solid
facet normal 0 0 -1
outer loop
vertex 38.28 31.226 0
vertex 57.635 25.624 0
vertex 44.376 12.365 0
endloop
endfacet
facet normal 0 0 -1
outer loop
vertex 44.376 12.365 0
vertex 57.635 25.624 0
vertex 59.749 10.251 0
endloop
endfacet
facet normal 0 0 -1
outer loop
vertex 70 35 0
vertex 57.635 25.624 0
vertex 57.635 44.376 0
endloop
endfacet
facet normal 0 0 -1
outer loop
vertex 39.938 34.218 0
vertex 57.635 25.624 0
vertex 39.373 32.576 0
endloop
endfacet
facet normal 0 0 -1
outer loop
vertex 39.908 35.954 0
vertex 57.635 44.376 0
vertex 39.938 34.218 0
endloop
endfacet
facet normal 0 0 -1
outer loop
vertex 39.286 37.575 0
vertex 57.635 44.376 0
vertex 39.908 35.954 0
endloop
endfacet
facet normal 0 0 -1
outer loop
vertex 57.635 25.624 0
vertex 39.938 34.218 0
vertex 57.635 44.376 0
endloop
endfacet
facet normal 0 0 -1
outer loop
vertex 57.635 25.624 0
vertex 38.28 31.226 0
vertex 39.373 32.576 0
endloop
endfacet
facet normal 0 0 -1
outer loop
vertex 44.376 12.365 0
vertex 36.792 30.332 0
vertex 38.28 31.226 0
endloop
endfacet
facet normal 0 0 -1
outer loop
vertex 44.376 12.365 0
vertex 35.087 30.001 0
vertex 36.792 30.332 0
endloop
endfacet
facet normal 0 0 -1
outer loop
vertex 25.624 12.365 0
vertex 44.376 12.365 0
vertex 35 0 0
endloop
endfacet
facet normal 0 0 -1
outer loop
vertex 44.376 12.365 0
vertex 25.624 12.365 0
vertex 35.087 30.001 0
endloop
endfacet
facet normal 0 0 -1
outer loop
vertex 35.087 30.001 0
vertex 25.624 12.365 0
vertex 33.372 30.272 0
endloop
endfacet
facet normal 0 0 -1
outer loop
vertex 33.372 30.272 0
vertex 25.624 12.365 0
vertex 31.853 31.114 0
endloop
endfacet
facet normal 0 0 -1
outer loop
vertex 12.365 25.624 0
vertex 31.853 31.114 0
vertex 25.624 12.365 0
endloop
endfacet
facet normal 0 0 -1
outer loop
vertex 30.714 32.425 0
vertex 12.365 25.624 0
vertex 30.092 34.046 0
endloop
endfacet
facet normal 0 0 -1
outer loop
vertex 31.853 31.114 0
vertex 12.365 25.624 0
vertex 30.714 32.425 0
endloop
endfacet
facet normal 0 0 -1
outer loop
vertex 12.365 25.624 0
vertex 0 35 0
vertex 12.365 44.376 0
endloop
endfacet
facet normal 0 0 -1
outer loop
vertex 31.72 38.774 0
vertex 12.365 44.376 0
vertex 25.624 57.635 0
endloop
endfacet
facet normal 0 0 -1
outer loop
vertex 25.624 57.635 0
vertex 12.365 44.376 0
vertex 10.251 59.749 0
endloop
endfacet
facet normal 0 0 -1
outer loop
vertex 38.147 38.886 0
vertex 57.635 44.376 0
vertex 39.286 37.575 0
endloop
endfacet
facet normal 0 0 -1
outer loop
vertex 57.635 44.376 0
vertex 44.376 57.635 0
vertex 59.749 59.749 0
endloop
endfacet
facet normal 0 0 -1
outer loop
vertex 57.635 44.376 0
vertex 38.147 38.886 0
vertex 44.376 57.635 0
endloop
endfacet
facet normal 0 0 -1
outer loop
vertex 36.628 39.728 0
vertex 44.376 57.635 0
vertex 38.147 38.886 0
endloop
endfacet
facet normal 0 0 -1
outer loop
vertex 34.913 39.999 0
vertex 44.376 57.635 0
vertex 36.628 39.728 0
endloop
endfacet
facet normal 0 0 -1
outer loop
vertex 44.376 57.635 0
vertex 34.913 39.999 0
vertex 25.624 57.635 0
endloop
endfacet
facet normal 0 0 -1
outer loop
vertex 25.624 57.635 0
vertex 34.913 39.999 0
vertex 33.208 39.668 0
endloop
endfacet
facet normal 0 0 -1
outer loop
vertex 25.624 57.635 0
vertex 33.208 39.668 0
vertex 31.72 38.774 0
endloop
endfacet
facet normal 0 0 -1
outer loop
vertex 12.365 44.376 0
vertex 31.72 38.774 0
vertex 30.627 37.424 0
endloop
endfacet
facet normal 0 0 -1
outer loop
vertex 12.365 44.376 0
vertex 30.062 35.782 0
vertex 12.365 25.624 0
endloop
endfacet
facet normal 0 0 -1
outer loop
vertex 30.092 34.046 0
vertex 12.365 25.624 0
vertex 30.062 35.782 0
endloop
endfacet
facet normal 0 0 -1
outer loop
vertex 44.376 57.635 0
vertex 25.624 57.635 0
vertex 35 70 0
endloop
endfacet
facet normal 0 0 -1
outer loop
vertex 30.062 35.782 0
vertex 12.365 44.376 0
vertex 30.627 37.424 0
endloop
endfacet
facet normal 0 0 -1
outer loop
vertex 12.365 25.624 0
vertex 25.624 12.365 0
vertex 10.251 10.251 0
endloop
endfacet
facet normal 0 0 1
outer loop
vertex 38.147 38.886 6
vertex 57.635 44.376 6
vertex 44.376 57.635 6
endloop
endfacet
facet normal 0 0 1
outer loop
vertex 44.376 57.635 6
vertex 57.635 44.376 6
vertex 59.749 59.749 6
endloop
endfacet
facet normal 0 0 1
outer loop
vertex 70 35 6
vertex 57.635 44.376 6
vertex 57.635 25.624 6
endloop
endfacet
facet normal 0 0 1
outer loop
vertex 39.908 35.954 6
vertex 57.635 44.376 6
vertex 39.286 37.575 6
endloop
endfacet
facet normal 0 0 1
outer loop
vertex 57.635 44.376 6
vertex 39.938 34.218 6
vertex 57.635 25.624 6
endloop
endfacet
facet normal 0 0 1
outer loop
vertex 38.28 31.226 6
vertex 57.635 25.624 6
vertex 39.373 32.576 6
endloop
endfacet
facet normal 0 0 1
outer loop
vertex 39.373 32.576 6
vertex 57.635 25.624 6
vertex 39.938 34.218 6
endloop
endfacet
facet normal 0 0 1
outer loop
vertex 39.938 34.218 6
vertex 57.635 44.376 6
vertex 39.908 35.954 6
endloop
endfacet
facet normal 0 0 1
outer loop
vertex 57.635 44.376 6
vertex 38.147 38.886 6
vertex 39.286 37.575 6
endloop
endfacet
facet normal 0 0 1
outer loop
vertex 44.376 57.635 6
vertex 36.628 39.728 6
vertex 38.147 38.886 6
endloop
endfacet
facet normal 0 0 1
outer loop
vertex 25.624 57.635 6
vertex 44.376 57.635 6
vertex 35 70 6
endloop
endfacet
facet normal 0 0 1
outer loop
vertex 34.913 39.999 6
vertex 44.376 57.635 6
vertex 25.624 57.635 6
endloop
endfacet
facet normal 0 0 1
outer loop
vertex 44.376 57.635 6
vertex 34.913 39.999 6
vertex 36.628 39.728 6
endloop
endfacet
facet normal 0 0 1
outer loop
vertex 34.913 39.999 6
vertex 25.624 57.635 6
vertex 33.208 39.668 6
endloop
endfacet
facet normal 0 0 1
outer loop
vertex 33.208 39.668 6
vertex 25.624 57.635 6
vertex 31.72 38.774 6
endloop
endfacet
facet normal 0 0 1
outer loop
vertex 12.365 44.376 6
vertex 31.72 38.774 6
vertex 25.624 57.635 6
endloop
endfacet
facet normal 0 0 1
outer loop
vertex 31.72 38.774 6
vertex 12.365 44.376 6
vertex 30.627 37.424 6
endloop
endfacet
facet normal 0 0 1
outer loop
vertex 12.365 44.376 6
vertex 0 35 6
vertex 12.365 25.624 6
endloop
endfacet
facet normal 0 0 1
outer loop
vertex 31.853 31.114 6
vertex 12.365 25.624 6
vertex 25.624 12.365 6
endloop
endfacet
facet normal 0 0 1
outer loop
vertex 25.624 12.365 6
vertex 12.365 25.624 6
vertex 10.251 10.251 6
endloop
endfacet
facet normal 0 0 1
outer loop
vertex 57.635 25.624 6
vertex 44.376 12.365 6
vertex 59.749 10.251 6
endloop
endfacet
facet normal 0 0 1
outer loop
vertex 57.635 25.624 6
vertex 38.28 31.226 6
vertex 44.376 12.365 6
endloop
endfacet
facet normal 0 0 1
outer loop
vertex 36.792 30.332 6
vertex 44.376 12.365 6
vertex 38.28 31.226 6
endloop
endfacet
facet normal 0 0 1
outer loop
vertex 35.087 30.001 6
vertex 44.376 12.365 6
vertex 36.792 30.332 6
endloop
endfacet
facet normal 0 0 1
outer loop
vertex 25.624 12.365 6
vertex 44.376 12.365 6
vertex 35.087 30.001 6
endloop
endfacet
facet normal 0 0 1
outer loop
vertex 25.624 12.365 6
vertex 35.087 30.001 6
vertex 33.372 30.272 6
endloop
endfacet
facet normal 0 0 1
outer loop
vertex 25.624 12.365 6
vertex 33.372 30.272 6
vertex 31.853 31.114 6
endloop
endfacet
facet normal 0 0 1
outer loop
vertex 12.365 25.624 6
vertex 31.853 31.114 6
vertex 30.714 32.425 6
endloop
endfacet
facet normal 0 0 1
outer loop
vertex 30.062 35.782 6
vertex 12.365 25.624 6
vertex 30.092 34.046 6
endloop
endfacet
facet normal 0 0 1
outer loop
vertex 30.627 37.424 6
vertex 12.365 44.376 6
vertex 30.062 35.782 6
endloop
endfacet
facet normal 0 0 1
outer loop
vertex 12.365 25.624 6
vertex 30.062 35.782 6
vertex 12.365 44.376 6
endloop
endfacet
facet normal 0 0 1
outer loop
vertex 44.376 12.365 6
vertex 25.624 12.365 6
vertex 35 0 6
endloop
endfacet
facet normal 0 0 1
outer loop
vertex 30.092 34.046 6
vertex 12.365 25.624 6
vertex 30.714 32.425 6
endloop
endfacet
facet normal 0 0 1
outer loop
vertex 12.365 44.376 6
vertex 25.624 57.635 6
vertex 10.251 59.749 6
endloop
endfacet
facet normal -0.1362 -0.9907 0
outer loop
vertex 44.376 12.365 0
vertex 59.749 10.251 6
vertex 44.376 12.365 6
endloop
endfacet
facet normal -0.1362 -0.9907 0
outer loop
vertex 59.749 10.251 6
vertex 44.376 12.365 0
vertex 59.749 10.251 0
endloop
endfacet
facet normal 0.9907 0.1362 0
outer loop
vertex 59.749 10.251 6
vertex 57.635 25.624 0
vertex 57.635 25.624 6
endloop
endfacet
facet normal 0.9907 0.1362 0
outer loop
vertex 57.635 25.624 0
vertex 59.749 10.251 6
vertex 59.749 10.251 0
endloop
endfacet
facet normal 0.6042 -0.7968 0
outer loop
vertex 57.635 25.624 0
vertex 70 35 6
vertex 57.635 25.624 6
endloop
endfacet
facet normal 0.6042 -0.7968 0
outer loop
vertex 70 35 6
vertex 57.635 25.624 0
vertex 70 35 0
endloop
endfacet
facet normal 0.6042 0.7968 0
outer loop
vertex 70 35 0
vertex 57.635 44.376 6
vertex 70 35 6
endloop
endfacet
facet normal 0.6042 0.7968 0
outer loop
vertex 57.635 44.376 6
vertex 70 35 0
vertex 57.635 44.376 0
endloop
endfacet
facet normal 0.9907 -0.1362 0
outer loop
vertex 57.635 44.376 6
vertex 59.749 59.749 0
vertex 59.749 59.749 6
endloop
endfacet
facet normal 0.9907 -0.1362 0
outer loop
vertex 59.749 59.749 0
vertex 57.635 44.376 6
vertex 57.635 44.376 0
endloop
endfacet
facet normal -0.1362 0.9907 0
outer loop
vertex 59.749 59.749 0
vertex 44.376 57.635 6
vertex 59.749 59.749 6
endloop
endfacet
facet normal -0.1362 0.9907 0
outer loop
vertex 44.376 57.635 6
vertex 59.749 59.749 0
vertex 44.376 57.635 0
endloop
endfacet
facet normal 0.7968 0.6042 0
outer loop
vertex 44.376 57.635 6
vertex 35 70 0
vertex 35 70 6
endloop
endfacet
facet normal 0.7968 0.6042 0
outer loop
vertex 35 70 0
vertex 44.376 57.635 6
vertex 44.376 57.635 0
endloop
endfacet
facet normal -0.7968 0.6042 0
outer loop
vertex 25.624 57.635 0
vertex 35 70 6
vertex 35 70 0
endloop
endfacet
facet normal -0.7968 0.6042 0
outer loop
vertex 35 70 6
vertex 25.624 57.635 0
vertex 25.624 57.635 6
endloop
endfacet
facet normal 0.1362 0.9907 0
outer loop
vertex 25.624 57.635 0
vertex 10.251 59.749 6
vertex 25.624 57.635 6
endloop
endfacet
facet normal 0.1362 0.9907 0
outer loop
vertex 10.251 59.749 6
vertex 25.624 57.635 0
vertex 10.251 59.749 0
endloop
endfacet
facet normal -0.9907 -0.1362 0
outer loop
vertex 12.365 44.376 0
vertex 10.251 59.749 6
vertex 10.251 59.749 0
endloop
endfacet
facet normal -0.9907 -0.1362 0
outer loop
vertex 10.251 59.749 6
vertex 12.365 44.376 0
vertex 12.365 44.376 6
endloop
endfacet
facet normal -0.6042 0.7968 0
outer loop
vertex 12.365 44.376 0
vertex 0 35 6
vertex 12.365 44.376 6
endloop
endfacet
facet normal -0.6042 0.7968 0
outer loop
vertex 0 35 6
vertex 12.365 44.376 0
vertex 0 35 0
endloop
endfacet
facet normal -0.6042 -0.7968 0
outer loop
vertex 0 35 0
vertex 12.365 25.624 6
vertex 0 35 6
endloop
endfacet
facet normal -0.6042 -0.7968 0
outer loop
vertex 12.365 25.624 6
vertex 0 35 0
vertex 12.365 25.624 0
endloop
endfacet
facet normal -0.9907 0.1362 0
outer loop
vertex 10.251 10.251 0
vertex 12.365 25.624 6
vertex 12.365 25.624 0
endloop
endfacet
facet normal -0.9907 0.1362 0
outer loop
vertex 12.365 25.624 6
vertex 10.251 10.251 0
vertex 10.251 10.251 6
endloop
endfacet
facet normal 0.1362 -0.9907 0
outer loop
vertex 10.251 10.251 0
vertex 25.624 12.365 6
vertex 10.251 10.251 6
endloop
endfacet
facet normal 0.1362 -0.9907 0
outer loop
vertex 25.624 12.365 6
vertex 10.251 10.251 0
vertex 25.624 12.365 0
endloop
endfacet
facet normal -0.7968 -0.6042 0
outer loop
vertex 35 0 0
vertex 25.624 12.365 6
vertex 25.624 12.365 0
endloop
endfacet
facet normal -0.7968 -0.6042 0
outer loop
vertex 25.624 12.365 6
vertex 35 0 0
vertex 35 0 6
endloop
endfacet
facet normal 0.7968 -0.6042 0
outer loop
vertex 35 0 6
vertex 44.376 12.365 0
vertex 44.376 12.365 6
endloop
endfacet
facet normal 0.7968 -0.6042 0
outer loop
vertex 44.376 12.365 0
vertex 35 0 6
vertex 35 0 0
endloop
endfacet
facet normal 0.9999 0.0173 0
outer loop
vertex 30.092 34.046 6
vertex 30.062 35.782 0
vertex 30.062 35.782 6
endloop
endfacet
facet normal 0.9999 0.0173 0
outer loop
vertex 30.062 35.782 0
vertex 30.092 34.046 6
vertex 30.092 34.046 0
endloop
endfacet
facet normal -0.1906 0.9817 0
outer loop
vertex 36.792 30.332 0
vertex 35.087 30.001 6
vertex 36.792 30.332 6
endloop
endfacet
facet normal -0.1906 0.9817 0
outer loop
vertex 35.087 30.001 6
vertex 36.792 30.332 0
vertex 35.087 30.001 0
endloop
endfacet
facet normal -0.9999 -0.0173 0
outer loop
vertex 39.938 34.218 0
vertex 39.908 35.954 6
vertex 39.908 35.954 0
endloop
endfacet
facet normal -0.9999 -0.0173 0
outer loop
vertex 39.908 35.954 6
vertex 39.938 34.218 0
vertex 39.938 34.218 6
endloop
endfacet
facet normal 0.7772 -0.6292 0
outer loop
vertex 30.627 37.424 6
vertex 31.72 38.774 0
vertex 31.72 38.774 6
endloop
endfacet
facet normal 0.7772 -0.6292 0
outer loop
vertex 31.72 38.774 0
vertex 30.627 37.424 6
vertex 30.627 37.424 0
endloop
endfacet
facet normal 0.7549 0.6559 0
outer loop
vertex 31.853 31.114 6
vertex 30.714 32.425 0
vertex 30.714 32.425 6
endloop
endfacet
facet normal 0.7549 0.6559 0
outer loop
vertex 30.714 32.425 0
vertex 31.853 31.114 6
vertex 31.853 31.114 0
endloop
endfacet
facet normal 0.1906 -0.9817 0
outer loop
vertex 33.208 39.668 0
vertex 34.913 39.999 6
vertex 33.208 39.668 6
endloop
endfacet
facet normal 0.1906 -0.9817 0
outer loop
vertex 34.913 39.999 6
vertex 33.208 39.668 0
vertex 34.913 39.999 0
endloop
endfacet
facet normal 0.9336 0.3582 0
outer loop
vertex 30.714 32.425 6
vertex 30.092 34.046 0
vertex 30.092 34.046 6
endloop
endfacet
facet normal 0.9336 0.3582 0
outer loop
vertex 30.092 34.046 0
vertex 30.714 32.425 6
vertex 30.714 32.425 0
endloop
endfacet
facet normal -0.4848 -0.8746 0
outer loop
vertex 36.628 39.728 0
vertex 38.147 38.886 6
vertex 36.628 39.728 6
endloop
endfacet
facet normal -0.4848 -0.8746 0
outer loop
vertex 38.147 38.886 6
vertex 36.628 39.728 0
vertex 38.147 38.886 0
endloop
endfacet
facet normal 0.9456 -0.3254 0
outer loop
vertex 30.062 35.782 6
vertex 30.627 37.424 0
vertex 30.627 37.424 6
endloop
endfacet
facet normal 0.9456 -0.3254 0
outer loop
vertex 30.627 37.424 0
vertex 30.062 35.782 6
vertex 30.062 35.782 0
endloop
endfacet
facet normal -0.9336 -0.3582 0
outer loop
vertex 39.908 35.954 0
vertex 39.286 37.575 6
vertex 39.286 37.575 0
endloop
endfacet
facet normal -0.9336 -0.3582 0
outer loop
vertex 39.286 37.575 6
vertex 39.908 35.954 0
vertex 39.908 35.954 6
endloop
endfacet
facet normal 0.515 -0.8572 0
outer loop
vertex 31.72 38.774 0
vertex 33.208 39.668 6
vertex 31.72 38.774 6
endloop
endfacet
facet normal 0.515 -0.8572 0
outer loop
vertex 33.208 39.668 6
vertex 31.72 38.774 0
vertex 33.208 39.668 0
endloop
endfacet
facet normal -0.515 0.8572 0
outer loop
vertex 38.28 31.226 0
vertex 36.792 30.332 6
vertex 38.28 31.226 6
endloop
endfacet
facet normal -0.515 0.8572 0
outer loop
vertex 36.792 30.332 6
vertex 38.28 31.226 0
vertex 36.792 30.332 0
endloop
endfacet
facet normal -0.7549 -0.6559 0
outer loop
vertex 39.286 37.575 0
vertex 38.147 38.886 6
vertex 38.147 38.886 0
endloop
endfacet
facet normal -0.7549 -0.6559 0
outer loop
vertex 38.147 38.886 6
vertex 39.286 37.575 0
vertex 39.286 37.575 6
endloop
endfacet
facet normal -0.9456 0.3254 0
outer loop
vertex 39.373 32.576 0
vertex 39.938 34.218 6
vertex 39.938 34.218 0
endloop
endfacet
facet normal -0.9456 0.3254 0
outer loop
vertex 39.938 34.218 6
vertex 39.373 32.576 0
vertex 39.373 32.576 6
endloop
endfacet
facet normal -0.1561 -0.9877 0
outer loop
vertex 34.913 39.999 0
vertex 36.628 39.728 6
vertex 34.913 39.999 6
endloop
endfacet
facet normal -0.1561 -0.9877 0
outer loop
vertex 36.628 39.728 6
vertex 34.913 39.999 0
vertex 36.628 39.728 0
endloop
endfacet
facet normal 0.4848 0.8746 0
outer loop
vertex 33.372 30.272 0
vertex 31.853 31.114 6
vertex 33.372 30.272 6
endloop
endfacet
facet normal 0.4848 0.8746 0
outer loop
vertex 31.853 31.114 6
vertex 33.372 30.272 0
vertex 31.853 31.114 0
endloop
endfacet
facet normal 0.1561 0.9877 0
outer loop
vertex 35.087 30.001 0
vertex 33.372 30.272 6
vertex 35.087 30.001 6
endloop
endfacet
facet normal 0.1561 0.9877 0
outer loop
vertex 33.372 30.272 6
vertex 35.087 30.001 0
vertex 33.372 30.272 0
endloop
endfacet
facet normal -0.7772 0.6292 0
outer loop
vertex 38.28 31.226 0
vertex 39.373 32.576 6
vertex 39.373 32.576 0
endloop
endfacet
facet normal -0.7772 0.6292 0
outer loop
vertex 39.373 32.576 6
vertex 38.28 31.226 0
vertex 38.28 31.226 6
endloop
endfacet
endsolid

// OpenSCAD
$fn = 32;

// ----------------------------------------------------------------------
// Star wheel: 8-point blunt, R35
// ----------------------------------------------------------------------

// --- parameters (mm) ---
n_points = 8;             // number of points / teeth
r_out = 35;               // tip radius
r_in = 24.5;              // root radius
bore_r = 5;               // centre bore radius
plate_t = 6;              // plate thickness, Z (extrusion height)
bore_d = 10;              // centre bore diameter

profile = [[35, 70], [25.624, 57.635], [10.251, 59.749], [12.365, 44.376], [0, 35], [12.365, 25.624], [10.251, 10.251], [25.624, 12.365], [35, 0], [44.376, 12.365], [59.749, 10.251], [57.635, 25.624], [70, 35], [57.635, 44.376], [59.749, 59.749], [44.376, 57.635]];  // primary outline, 16 points, counter clockwise
void_1 = [[39.908, 35.954], [39.286, 37.575], [38.147, 38.886], [36.628, 39.728], [34.913, 39.999], [33.208, 39.668], [31.72, 38.774], [30.627, 37.424], [30.062, 35.782], [30.092, 34.046], [30.714, 32.425], [31.853, 31.114], [33.372, 30.272], [35.087, 30.001], [36.792, 30.332], [38.28, 31.226], [39.373, 32.576], [39.938, 34.218]];  // centre bore, 18 points

// --- the one profile operation ---
difference() {
  linear_extrude(height = plate_t) polygon(points = profile);
  translate([0, 0, -1])
    linear_extrude(height = plate_t + 2) polygon(points = void_1);
}
